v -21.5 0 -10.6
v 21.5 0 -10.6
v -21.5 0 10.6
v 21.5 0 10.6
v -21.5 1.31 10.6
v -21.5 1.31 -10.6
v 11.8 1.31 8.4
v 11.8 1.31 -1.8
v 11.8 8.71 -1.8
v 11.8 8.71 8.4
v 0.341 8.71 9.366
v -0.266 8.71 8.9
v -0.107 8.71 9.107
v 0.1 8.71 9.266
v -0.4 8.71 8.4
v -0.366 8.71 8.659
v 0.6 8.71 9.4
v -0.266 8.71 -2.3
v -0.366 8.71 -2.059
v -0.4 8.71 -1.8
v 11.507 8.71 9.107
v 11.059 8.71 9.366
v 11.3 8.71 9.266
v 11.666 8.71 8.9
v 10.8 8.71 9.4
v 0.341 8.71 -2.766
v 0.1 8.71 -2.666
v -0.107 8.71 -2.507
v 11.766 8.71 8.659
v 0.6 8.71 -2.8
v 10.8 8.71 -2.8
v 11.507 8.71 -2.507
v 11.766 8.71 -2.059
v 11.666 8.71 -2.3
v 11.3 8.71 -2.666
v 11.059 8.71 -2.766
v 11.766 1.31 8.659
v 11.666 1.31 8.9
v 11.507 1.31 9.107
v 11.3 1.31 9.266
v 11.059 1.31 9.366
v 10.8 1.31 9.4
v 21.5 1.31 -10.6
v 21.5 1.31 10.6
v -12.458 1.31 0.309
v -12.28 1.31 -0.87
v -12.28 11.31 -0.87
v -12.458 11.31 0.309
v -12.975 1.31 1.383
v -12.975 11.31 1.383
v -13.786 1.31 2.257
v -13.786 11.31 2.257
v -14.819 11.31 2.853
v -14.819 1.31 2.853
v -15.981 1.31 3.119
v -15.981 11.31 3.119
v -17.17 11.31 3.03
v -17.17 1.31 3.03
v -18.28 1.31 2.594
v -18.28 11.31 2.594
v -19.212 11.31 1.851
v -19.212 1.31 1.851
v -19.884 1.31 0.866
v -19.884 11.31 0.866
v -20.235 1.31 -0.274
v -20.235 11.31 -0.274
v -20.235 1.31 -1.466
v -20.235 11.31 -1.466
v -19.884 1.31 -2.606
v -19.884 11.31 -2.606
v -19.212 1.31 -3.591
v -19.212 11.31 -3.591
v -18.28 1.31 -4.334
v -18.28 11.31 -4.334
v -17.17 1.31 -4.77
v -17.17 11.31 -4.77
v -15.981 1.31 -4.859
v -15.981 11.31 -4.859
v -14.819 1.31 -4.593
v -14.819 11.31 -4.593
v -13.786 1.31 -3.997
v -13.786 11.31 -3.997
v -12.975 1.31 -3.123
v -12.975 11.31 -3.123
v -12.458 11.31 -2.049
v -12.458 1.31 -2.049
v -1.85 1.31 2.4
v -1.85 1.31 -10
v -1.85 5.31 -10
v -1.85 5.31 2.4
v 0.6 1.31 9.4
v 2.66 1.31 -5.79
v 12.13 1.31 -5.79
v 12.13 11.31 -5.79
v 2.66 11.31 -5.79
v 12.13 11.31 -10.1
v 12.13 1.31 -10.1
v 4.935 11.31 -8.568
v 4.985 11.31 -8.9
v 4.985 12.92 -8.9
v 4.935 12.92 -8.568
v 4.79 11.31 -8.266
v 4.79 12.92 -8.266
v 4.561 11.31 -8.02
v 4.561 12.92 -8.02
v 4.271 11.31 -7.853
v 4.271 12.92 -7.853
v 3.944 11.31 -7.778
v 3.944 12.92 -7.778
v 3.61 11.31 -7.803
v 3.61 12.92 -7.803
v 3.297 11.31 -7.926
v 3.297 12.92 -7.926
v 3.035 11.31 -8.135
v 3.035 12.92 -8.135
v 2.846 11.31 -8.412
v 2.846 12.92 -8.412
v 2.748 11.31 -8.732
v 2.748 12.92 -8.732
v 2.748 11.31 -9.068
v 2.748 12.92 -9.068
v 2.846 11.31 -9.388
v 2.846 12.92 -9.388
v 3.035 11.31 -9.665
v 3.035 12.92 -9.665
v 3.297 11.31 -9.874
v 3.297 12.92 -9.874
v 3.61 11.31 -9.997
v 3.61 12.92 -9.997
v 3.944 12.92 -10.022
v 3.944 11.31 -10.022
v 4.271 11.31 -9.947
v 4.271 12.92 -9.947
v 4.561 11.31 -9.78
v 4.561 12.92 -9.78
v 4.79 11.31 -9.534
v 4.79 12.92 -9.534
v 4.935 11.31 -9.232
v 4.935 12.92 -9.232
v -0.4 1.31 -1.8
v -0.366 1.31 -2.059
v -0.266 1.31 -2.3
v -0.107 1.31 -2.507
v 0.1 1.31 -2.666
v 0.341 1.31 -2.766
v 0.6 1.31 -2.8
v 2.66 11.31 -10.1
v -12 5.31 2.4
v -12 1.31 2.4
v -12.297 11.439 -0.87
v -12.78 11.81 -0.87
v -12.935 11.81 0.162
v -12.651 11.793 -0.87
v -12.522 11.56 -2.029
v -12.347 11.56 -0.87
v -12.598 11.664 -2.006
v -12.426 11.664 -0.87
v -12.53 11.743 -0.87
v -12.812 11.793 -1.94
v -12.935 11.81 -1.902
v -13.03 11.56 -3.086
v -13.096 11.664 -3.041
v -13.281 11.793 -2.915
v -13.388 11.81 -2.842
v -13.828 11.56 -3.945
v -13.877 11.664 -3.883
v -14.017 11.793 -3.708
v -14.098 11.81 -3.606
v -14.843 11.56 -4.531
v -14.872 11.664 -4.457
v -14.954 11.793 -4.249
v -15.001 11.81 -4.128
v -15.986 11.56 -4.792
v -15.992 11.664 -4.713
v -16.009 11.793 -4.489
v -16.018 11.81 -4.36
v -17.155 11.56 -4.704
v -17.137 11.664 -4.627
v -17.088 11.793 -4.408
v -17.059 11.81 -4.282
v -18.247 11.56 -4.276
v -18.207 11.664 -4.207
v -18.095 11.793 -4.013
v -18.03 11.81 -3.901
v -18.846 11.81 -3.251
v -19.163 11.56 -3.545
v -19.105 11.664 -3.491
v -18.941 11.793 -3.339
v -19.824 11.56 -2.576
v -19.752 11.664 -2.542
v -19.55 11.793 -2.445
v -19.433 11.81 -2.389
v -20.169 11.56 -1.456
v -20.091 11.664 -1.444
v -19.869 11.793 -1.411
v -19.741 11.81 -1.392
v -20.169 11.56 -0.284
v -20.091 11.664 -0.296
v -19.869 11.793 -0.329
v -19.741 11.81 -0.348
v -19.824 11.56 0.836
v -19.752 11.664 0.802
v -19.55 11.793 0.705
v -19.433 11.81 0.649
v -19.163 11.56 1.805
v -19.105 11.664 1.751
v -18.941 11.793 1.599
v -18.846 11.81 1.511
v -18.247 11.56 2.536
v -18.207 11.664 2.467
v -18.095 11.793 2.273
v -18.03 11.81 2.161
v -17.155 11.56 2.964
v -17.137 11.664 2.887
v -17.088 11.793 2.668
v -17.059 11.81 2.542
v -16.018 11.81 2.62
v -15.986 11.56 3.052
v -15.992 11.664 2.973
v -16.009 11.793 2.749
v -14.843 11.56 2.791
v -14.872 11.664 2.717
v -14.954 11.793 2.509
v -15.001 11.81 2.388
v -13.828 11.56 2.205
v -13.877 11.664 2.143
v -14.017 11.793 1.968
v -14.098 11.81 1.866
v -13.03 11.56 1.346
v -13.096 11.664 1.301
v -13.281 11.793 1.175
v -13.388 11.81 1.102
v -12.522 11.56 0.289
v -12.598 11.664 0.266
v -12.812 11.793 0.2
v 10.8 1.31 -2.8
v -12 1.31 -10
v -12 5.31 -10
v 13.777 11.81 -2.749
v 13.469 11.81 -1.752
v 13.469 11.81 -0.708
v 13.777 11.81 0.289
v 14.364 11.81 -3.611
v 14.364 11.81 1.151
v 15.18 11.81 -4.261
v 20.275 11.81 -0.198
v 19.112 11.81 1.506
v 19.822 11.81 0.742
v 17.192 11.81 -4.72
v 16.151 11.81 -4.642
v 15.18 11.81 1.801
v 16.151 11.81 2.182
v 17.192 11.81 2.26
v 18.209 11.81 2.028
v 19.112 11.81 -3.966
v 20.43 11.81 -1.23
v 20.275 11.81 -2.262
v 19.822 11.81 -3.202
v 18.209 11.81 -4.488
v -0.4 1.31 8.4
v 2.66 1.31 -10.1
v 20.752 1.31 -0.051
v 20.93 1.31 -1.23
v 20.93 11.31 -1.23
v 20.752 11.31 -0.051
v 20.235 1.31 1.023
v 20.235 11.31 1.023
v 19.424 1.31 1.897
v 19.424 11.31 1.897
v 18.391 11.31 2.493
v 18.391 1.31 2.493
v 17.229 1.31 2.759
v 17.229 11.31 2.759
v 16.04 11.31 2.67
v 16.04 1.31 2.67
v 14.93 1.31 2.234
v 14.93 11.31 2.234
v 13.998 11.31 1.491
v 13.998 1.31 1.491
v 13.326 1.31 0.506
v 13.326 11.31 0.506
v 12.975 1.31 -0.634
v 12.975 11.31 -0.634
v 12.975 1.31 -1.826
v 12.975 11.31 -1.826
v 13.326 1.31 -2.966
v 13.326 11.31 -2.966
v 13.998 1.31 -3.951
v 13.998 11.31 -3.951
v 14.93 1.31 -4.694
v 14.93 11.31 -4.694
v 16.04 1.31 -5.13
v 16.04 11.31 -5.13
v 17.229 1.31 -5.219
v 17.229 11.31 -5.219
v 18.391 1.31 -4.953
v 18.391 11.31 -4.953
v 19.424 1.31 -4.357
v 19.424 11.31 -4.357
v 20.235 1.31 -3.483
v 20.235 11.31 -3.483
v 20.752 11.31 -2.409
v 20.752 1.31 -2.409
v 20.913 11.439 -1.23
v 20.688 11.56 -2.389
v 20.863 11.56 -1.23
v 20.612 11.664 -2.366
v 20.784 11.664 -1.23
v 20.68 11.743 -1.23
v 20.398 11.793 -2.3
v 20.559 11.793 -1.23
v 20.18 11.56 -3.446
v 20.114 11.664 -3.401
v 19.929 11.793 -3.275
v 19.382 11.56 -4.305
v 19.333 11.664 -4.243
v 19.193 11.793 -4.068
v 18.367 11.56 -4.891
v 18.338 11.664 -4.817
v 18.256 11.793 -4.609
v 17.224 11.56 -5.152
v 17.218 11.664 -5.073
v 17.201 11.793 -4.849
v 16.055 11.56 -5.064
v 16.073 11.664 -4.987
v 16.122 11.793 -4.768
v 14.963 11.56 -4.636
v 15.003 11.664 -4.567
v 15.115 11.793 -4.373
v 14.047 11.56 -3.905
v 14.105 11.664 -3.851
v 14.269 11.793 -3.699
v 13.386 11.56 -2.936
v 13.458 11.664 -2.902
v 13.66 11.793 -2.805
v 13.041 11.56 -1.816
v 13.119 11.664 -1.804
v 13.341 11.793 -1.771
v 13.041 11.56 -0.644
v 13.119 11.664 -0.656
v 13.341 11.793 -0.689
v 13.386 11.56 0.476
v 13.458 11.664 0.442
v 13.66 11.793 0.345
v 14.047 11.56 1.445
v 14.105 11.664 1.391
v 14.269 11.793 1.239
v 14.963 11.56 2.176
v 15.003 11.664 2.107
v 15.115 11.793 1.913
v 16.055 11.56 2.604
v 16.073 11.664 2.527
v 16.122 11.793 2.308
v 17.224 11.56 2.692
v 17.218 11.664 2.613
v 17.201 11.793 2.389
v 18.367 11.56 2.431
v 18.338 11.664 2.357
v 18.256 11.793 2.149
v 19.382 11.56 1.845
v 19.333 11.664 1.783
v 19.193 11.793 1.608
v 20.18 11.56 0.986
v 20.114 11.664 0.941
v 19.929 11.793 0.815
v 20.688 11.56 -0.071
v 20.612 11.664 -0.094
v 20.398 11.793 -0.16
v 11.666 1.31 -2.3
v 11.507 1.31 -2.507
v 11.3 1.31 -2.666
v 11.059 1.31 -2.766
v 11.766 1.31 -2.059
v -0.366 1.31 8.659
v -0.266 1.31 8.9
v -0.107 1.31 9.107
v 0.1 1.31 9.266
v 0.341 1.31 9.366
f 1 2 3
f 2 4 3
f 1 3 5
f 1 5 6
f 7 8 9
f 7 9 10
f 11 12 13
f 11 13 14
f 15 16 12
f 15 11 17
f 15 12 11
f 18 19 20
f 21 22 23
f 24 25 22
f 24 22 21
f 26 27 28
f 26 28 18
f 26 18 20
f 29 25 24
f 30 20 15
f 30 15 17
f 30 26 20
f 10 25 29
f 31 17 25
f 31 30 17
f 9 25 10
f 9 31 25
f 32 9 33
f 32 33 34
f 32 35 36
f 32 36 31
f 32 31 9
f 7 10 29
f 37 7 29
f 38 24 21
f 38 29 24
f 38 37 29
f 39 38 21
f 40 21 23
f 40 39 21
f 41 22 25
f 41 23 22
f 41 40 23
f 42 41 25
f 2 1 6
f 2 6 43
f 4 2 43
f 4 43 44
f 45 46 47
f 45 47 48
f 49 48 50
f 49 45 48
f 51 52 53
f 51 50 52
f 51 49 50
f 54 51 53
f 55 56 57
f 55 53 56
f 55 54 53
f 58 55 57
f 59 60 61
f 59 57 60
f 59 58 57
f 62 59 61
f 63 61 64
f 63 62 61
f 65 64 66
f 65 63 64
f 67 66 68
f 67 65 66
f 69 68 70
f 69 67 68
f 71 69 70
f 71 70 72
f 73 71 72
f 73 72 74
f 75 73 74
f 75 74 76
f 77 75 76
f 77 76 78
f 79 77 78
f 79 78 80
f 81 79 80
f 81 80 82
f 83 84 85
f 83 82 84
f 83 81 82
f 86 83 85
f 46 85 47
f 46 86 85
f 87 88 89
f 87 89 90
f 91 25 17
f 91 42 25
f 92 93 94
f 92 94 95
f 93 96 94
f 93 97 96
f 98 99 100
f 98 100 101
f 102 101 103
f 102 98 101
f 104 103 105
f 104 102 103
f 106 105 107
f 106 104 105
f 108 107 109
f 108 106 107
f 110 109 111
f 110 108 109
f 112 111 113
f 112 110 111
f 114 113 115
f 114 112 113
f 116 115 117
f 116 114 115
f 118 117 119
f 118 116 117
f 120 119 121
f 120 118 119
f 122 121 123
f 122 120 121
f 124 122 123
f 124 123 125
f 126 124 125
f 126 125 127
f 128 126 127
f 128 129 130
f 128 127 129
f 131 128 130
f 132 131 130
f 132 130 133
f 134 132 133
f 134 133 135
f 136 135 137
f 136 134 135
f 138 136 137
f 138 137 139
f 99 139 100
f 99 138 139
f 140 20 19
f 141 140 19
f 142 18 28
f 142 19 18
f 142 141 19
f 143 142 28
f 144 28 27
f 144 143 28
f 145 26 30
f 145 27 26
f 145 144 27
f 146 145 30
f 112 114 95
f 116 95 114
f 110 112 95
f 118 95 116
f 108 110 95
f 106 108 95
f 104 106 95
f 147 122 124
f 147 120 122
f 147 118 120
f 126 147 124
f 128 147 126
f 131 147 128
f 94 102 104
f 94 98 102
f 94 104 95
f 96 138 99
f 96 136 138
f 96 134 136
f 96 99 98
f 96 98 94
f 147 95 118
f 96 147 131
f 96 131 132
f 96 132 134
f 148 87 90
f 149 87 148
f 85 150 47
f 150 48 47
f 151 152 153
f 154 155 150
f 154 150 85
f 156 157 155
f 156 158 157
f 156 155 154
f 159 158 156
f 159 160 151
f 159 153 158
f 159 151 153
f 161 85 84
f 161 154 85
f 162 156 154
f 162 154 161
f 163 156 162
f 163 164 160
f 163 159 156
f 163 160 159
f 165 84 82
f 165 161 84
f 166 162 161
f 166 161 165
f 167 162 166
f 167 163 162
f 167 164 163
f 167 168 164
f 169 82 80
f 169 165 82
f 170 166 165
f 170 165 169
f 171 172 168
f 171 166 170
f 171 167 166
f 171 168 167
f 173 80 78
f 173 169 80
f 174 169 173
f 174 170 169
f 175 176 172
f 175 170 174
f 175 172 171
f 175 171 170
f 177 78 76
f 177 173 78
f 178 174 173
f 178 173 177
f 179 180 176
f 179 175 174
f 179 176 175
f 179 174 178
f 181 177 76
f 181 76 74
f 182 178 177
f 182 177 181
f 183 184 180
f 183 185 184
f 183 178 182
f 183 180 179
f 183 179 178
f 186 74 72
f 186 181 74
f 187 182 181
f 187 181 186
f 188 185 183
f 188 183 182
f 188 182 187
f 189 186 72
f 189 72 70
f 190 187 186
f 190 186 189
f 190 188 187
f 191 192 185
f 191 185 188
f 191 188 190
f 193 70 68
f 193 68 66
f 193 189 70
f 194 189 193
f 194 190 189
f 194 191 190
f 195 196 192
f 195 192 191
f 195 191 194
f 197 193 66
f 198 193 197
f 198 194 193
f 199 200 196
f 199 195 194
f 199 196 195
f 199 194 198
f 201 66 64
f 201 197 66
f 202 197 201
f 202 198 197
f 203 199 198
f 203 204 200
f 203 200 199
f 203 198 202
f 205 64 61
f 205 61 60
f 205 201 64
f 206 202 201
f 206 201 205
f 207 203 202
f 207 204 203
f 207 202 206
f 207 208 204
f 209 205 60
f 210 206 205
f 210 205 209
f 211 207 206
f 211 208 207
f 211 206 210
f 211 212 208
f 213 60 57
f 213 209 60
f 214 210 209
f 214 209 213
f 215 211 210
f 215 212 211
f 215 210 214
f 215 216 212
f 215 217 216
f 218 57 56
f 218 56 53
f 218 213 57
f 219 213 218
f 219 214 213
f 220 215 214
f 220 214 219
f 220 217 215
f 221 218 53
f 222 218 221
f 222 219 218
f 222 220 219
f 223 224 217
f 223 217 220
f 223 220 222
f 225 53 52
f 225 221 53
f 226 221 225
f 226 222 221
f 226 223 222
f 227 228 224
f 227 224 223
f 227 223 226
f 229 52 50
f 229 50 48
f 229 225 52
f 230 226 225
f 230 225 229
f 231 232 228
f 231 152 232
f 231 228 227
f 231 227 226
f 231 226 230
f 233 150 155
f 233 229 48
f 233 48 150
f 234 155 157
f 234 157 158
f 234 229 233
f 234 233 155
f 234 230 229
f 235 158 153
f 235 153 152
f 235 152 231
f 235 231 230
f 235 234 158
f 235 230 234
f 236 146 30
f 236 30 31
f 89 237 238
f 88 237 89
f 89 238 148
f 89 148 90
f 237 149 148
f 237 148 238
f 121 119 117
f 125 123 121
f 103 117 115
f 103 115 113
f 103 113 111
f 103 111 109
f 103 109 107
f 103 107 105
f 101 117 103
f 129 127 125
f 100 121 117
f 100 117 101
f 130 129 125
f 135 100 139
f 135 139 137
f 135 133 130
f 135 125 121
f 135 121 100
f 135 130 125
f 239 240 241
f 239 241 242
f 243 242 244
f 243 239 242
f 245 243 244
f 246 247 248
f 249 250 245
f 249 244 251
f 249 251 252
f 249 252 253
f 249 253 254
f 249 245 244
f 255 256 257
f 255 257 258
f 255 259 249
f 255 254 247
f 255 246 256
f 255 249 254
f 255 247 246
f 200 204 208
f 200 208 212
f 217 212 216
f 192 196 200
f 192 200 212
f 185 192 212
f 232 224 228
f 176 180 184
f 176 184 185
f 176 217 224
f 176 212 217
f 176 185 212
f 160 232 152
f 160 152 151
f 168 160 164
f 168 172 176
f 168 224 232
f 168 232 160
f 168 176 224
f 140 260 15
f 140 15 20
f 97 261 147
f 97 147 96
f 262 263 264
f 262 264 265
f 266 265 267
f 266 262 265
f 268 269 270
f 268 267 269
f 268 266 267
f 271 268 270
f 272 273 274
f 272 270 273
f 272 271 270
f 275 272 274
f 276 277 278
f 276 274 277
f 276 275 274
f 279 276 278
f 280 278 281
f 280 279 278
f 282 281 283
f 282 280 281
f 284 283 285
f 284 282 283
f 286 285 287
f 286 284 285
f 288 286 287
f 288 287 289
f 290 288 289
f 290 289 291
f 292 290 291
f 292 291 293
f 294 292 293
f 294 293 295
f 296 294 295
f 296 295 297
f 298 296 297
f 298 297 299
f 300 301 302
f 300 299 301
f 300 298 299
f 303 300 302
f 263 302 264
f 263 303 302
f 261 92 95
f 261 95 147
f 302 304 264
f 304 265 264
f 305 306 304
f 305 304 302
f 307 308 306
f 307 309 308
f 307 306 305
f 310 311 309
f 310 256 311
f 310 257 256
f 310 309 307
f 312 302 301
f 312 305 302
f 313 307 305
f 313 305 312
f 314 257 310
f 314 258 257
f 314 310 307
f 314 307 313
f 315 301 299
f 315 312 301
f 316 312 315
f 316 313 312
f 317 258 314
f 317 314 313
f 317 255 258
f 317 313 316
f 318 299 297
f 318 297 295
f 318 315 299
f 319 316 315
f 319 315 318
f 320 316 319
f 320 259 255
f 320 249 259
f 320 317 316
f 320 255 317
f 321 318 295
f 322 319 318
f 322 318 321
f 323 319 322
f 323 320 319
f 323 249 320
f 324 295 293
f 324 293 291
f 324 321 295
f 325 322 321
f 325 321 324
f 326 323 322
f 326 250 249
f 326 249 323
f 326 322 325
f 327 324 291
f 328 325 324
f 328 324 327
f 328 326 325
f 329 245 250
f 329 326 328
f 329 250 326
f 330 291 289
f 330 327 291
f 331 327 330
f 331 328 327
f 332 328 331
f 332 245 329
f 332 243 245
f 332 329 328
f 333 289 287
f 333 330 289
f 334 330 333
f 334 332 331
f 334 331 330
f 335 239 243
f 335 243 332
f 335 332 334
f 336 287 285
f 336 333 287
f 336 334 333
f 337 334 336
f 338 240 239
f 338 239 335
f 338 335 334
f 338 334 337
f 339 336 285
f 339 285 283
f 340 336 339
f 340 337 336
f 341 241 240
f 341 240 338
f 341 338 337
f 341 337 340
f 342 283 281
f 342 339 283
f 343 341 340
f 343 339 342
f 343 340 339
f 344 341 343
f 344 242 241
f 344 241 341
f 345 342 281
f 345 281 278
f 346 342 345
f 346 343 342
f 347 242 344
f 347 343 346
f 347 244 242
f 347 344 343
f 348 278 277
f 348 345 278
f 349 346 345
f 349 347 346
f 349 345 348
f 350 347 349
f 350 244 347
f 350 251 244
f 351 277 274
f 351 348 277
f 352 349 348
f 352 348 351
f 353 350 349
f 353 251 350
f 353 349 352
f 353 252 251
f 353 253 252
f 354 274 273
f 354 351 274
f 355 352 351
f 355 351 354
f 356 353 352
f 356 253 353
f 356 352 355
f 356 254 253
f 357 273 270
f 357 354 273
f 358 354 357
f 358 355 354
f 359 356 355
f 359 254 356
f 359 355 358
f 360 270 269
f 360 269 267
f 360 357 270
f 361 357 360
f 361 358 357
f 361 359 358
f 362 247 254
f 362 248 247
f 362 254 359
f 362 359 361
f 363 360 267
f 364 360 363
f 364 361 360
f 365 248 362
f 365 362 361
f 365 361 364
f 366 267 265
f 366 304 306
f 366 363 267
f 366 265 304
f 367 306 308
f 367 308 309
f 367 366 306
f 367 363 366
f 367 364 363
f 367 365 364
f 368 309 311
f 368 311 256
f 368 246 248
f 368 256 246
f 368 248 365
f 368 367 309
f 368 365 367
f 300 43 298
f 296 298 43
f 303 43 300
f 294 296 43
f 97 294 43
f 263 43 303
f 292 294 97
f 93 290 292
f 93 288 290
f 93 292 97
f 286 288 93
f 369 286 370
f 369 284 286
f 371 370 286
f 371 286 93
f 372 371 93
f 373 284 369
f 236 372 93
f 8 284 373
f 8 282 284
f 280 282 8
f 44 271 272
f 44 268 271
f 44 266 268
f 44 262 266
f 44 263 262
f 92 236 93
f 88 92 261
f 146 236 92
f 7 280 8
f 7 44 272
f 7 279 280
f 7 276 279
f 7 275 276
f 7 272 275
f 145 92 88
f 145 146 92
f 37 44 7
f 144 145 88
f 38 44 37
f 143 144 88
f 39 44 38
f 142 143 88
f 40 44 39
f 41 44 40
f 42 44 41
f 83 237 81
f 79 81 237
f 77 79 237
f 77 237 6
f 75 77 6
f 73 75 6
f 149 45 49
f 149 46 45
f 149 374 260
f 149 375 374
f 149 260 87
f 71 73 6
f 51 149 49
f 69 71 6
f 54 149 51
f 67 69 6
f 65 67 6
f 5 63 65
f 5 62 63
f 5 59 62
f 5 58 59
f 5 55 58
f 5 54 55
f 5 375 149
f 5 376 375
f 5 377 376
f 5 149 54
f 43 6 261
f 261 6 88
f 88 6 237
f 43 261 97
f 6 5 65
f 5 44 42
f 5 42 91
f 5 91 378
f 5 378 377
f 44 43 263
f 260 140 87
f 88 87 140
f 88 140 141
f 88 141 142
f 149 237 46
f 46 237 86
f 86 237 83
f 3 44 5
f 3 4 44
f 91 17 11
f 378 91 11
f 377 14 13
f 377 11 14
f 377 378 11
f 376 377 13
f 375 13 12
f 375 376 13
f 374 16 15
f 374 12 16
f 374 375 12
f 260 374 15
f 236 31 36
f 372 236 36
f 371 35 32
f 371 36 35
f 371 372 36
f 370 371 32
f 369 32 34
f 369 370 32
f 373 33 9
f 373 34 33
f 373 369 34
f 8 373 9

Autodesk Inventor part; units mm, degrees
ref_plane "YZ Plane" through (0, 0, 0) normal (1, 0, 0) x (0, 1, 0)
ref_plane "XZ Plane" through (0, 0, 0) normal (0, 1, 0) x (-1, 0, 0)
ref_plane "XY Plane" through (0, 0, 0) normal (0, 0, 1) x (1, 0, 0)
sketch "Sketch1" plane through (0, 0, 0) normal (0, 1, 0) x (-1, 0, 0)
  line L0 (21.5, -10.6) -> (-21.5, -10.6)
  line L1 (-21.5, -10.6) -> (-21.5, 10.6)
  line L2 (-21.5, 10.6) -> (21.5, 10.6)
  line L3 (21.5, 10.6) -> (21.5, -10.6)
  point P0 (0, 0)
  dimension "d0" = 43
  dimension "d1" = 21.2
  dimension "d2" = 10.6
  dimension "d3" = 21.5
extrude "Extrusion1" add sketch "Sketch1" along normal blind 1.31
sketch "Sketch2" plane through (0, 1.31, 0) normal (0, 1, 0) x (1, 0, 0)
  line L0 (-12, 10) -> (-1.85, 10)
  line L1 (-1.85, 10) -> (-1.85, -2.4)
  line L2 (-1.85, -2.4) -> (-12, -2.4)
  line L3 (-12, -2.4) -> (-12, 10)
  line L4 (-21.5, -10.6) -> (21.5, -10.6) projected
  line L5 (-21.5, 10.6) -> (-21.5, -10.6) projected
  point P0 (0, 0)
  dimension "d6" = 12.4
  dimension "d7" = 10.15
  dimension "d8" = 8.2
  dimension "d9" = 9.5
extrude "Extrusion2" add sketch "Sketch2" along normal blind 4
sketch "Sketch3" plane through (0, 1.31, 0) normal (0, 1, 0) x (1, 0, 0)
  line L0 (0.6, 2.8) -> (10.8, 2.8)
  line L1 (11.8, 1.8) -> (11.8, -8.4)
  line L2 (10.8, -9.4) -> (0.6, -9.4)
  line L3 (-0.4, -8.4) -> (-0.4, 1.8)
  line L4 (-21.5, -10.6) -> (21.5, -10.6) projected
  line L5 (21.5, -10.6) -> (21.5, 10.6) projected
  arc A0 (0.6, 2.8) -> (-0.4, 1.8) centre (0.6, 1.8) ccw
  arc A1 (11.8, 1.8) -> (10.8, 2.8) centre (10.8, 1.8) ccw
  arc A2 (10.8, -9.4) -> (11.8, -8.4) centre (10.8, -8.4) ccw
  arc A3 (-0.4, -8.4) -> (0.6, -9.4) centre (0.6, -8.4) ccw
  point P0 (0, 0)
  dimension "d12" = 12.2
  dimension "d13" = 12.2
  dimension "d14" = 1.2
  dimension "d15" = 9.7
  dimension "d16" = 1
extrude "Extrusion3" add sketch "Sketch3" along normal blind 7.4
sketch "Sketch4" plane through (0, 1.31, 0) normal (0, 1, 0) x (1, 0, 0)
  line L0 (2.66, 10.1) -> (12.13, 10.1)
  line L1 (12.13, 10.1) -> (12.13, 5.79)
  line L2 (12.13, 5.79) -> (2.66, 5.79)
  line L3 (2.66, 5.79) -> (2.66, 10.1)
  line L4 (21.5, -10.6) -> (21.5, 10.6) projected
  line L5 (21.5, 10.6) -> (-21.5, 10.6) projected
  point P0 (0, 0)
  dimension "d19" = 4.31
  dimension "d20" = 9.47
  dimension "d21" = 9.37
  dimension "d22" = 0.5
extrude "Extrusion4" add sketch "Sketch4" along normal blind 10
sketch "Sketch5" plane through (0, 11.31, 0) normal (0, 1, 0) x (1, 0, 0)
  circle A0 centre (3.86, 8.9) radius 1.125
  line L0 (12.13, 10.1) -> (2.66, 10.1) projected
  line L1 (2.66, 10.1) -> (2.66, 5.79) projected
  point P0 (0, 0)
  point P1 (2.66, 9.2358)
  point P2 (2.66, 8.7642)
  point P3 (4.0958, 10.1)
  point P4 (3.6242, 10.1)
  dimension "d25" = 2.25
  dimension "d26" = 1.2
  dimension "d27" = 1.2
extrude "Extrusion5" add sketch "Sketch5" along normal blind 1.61
sketch "Sketch6" plane through (0, 1.31, 0) normal (0, 1, 0) x (1, 0, 0)
  circle A0 centre (-16.28, 0.87) radius 4
  circle A1 centre (16.93, 1.23) radius 4
  line L0 (-21.5, -10.6) -> (21.5, -10.6) projected
  line L1 (21.5, -10.6) -> (21.5, 10.6) projected
  line L2 (-21.5, 10.6) -> (-21.5, -10.6) projected
  point P0 (0, 0)
  dimension "d30" = 8
  dimension "d31" = 8
  dimension "d32" = 11.83
  dimension "d33" = 4.57
  dimension "d34" = 5.22
  dimension "d35" = 11.47
extrude "Extrusion6" add sketch "Sketch6" along normal blind 10.5
fillet "Fillet1" radius 0.5 2 edges at (12.93, 11.81, -1.23) (-20.28, 11.81, -0.87)
equation "\"d2\" = 0.5 * d1"
equation "\"d3\" = 0.5 * d0"
properties part number "Control and Power Box"
